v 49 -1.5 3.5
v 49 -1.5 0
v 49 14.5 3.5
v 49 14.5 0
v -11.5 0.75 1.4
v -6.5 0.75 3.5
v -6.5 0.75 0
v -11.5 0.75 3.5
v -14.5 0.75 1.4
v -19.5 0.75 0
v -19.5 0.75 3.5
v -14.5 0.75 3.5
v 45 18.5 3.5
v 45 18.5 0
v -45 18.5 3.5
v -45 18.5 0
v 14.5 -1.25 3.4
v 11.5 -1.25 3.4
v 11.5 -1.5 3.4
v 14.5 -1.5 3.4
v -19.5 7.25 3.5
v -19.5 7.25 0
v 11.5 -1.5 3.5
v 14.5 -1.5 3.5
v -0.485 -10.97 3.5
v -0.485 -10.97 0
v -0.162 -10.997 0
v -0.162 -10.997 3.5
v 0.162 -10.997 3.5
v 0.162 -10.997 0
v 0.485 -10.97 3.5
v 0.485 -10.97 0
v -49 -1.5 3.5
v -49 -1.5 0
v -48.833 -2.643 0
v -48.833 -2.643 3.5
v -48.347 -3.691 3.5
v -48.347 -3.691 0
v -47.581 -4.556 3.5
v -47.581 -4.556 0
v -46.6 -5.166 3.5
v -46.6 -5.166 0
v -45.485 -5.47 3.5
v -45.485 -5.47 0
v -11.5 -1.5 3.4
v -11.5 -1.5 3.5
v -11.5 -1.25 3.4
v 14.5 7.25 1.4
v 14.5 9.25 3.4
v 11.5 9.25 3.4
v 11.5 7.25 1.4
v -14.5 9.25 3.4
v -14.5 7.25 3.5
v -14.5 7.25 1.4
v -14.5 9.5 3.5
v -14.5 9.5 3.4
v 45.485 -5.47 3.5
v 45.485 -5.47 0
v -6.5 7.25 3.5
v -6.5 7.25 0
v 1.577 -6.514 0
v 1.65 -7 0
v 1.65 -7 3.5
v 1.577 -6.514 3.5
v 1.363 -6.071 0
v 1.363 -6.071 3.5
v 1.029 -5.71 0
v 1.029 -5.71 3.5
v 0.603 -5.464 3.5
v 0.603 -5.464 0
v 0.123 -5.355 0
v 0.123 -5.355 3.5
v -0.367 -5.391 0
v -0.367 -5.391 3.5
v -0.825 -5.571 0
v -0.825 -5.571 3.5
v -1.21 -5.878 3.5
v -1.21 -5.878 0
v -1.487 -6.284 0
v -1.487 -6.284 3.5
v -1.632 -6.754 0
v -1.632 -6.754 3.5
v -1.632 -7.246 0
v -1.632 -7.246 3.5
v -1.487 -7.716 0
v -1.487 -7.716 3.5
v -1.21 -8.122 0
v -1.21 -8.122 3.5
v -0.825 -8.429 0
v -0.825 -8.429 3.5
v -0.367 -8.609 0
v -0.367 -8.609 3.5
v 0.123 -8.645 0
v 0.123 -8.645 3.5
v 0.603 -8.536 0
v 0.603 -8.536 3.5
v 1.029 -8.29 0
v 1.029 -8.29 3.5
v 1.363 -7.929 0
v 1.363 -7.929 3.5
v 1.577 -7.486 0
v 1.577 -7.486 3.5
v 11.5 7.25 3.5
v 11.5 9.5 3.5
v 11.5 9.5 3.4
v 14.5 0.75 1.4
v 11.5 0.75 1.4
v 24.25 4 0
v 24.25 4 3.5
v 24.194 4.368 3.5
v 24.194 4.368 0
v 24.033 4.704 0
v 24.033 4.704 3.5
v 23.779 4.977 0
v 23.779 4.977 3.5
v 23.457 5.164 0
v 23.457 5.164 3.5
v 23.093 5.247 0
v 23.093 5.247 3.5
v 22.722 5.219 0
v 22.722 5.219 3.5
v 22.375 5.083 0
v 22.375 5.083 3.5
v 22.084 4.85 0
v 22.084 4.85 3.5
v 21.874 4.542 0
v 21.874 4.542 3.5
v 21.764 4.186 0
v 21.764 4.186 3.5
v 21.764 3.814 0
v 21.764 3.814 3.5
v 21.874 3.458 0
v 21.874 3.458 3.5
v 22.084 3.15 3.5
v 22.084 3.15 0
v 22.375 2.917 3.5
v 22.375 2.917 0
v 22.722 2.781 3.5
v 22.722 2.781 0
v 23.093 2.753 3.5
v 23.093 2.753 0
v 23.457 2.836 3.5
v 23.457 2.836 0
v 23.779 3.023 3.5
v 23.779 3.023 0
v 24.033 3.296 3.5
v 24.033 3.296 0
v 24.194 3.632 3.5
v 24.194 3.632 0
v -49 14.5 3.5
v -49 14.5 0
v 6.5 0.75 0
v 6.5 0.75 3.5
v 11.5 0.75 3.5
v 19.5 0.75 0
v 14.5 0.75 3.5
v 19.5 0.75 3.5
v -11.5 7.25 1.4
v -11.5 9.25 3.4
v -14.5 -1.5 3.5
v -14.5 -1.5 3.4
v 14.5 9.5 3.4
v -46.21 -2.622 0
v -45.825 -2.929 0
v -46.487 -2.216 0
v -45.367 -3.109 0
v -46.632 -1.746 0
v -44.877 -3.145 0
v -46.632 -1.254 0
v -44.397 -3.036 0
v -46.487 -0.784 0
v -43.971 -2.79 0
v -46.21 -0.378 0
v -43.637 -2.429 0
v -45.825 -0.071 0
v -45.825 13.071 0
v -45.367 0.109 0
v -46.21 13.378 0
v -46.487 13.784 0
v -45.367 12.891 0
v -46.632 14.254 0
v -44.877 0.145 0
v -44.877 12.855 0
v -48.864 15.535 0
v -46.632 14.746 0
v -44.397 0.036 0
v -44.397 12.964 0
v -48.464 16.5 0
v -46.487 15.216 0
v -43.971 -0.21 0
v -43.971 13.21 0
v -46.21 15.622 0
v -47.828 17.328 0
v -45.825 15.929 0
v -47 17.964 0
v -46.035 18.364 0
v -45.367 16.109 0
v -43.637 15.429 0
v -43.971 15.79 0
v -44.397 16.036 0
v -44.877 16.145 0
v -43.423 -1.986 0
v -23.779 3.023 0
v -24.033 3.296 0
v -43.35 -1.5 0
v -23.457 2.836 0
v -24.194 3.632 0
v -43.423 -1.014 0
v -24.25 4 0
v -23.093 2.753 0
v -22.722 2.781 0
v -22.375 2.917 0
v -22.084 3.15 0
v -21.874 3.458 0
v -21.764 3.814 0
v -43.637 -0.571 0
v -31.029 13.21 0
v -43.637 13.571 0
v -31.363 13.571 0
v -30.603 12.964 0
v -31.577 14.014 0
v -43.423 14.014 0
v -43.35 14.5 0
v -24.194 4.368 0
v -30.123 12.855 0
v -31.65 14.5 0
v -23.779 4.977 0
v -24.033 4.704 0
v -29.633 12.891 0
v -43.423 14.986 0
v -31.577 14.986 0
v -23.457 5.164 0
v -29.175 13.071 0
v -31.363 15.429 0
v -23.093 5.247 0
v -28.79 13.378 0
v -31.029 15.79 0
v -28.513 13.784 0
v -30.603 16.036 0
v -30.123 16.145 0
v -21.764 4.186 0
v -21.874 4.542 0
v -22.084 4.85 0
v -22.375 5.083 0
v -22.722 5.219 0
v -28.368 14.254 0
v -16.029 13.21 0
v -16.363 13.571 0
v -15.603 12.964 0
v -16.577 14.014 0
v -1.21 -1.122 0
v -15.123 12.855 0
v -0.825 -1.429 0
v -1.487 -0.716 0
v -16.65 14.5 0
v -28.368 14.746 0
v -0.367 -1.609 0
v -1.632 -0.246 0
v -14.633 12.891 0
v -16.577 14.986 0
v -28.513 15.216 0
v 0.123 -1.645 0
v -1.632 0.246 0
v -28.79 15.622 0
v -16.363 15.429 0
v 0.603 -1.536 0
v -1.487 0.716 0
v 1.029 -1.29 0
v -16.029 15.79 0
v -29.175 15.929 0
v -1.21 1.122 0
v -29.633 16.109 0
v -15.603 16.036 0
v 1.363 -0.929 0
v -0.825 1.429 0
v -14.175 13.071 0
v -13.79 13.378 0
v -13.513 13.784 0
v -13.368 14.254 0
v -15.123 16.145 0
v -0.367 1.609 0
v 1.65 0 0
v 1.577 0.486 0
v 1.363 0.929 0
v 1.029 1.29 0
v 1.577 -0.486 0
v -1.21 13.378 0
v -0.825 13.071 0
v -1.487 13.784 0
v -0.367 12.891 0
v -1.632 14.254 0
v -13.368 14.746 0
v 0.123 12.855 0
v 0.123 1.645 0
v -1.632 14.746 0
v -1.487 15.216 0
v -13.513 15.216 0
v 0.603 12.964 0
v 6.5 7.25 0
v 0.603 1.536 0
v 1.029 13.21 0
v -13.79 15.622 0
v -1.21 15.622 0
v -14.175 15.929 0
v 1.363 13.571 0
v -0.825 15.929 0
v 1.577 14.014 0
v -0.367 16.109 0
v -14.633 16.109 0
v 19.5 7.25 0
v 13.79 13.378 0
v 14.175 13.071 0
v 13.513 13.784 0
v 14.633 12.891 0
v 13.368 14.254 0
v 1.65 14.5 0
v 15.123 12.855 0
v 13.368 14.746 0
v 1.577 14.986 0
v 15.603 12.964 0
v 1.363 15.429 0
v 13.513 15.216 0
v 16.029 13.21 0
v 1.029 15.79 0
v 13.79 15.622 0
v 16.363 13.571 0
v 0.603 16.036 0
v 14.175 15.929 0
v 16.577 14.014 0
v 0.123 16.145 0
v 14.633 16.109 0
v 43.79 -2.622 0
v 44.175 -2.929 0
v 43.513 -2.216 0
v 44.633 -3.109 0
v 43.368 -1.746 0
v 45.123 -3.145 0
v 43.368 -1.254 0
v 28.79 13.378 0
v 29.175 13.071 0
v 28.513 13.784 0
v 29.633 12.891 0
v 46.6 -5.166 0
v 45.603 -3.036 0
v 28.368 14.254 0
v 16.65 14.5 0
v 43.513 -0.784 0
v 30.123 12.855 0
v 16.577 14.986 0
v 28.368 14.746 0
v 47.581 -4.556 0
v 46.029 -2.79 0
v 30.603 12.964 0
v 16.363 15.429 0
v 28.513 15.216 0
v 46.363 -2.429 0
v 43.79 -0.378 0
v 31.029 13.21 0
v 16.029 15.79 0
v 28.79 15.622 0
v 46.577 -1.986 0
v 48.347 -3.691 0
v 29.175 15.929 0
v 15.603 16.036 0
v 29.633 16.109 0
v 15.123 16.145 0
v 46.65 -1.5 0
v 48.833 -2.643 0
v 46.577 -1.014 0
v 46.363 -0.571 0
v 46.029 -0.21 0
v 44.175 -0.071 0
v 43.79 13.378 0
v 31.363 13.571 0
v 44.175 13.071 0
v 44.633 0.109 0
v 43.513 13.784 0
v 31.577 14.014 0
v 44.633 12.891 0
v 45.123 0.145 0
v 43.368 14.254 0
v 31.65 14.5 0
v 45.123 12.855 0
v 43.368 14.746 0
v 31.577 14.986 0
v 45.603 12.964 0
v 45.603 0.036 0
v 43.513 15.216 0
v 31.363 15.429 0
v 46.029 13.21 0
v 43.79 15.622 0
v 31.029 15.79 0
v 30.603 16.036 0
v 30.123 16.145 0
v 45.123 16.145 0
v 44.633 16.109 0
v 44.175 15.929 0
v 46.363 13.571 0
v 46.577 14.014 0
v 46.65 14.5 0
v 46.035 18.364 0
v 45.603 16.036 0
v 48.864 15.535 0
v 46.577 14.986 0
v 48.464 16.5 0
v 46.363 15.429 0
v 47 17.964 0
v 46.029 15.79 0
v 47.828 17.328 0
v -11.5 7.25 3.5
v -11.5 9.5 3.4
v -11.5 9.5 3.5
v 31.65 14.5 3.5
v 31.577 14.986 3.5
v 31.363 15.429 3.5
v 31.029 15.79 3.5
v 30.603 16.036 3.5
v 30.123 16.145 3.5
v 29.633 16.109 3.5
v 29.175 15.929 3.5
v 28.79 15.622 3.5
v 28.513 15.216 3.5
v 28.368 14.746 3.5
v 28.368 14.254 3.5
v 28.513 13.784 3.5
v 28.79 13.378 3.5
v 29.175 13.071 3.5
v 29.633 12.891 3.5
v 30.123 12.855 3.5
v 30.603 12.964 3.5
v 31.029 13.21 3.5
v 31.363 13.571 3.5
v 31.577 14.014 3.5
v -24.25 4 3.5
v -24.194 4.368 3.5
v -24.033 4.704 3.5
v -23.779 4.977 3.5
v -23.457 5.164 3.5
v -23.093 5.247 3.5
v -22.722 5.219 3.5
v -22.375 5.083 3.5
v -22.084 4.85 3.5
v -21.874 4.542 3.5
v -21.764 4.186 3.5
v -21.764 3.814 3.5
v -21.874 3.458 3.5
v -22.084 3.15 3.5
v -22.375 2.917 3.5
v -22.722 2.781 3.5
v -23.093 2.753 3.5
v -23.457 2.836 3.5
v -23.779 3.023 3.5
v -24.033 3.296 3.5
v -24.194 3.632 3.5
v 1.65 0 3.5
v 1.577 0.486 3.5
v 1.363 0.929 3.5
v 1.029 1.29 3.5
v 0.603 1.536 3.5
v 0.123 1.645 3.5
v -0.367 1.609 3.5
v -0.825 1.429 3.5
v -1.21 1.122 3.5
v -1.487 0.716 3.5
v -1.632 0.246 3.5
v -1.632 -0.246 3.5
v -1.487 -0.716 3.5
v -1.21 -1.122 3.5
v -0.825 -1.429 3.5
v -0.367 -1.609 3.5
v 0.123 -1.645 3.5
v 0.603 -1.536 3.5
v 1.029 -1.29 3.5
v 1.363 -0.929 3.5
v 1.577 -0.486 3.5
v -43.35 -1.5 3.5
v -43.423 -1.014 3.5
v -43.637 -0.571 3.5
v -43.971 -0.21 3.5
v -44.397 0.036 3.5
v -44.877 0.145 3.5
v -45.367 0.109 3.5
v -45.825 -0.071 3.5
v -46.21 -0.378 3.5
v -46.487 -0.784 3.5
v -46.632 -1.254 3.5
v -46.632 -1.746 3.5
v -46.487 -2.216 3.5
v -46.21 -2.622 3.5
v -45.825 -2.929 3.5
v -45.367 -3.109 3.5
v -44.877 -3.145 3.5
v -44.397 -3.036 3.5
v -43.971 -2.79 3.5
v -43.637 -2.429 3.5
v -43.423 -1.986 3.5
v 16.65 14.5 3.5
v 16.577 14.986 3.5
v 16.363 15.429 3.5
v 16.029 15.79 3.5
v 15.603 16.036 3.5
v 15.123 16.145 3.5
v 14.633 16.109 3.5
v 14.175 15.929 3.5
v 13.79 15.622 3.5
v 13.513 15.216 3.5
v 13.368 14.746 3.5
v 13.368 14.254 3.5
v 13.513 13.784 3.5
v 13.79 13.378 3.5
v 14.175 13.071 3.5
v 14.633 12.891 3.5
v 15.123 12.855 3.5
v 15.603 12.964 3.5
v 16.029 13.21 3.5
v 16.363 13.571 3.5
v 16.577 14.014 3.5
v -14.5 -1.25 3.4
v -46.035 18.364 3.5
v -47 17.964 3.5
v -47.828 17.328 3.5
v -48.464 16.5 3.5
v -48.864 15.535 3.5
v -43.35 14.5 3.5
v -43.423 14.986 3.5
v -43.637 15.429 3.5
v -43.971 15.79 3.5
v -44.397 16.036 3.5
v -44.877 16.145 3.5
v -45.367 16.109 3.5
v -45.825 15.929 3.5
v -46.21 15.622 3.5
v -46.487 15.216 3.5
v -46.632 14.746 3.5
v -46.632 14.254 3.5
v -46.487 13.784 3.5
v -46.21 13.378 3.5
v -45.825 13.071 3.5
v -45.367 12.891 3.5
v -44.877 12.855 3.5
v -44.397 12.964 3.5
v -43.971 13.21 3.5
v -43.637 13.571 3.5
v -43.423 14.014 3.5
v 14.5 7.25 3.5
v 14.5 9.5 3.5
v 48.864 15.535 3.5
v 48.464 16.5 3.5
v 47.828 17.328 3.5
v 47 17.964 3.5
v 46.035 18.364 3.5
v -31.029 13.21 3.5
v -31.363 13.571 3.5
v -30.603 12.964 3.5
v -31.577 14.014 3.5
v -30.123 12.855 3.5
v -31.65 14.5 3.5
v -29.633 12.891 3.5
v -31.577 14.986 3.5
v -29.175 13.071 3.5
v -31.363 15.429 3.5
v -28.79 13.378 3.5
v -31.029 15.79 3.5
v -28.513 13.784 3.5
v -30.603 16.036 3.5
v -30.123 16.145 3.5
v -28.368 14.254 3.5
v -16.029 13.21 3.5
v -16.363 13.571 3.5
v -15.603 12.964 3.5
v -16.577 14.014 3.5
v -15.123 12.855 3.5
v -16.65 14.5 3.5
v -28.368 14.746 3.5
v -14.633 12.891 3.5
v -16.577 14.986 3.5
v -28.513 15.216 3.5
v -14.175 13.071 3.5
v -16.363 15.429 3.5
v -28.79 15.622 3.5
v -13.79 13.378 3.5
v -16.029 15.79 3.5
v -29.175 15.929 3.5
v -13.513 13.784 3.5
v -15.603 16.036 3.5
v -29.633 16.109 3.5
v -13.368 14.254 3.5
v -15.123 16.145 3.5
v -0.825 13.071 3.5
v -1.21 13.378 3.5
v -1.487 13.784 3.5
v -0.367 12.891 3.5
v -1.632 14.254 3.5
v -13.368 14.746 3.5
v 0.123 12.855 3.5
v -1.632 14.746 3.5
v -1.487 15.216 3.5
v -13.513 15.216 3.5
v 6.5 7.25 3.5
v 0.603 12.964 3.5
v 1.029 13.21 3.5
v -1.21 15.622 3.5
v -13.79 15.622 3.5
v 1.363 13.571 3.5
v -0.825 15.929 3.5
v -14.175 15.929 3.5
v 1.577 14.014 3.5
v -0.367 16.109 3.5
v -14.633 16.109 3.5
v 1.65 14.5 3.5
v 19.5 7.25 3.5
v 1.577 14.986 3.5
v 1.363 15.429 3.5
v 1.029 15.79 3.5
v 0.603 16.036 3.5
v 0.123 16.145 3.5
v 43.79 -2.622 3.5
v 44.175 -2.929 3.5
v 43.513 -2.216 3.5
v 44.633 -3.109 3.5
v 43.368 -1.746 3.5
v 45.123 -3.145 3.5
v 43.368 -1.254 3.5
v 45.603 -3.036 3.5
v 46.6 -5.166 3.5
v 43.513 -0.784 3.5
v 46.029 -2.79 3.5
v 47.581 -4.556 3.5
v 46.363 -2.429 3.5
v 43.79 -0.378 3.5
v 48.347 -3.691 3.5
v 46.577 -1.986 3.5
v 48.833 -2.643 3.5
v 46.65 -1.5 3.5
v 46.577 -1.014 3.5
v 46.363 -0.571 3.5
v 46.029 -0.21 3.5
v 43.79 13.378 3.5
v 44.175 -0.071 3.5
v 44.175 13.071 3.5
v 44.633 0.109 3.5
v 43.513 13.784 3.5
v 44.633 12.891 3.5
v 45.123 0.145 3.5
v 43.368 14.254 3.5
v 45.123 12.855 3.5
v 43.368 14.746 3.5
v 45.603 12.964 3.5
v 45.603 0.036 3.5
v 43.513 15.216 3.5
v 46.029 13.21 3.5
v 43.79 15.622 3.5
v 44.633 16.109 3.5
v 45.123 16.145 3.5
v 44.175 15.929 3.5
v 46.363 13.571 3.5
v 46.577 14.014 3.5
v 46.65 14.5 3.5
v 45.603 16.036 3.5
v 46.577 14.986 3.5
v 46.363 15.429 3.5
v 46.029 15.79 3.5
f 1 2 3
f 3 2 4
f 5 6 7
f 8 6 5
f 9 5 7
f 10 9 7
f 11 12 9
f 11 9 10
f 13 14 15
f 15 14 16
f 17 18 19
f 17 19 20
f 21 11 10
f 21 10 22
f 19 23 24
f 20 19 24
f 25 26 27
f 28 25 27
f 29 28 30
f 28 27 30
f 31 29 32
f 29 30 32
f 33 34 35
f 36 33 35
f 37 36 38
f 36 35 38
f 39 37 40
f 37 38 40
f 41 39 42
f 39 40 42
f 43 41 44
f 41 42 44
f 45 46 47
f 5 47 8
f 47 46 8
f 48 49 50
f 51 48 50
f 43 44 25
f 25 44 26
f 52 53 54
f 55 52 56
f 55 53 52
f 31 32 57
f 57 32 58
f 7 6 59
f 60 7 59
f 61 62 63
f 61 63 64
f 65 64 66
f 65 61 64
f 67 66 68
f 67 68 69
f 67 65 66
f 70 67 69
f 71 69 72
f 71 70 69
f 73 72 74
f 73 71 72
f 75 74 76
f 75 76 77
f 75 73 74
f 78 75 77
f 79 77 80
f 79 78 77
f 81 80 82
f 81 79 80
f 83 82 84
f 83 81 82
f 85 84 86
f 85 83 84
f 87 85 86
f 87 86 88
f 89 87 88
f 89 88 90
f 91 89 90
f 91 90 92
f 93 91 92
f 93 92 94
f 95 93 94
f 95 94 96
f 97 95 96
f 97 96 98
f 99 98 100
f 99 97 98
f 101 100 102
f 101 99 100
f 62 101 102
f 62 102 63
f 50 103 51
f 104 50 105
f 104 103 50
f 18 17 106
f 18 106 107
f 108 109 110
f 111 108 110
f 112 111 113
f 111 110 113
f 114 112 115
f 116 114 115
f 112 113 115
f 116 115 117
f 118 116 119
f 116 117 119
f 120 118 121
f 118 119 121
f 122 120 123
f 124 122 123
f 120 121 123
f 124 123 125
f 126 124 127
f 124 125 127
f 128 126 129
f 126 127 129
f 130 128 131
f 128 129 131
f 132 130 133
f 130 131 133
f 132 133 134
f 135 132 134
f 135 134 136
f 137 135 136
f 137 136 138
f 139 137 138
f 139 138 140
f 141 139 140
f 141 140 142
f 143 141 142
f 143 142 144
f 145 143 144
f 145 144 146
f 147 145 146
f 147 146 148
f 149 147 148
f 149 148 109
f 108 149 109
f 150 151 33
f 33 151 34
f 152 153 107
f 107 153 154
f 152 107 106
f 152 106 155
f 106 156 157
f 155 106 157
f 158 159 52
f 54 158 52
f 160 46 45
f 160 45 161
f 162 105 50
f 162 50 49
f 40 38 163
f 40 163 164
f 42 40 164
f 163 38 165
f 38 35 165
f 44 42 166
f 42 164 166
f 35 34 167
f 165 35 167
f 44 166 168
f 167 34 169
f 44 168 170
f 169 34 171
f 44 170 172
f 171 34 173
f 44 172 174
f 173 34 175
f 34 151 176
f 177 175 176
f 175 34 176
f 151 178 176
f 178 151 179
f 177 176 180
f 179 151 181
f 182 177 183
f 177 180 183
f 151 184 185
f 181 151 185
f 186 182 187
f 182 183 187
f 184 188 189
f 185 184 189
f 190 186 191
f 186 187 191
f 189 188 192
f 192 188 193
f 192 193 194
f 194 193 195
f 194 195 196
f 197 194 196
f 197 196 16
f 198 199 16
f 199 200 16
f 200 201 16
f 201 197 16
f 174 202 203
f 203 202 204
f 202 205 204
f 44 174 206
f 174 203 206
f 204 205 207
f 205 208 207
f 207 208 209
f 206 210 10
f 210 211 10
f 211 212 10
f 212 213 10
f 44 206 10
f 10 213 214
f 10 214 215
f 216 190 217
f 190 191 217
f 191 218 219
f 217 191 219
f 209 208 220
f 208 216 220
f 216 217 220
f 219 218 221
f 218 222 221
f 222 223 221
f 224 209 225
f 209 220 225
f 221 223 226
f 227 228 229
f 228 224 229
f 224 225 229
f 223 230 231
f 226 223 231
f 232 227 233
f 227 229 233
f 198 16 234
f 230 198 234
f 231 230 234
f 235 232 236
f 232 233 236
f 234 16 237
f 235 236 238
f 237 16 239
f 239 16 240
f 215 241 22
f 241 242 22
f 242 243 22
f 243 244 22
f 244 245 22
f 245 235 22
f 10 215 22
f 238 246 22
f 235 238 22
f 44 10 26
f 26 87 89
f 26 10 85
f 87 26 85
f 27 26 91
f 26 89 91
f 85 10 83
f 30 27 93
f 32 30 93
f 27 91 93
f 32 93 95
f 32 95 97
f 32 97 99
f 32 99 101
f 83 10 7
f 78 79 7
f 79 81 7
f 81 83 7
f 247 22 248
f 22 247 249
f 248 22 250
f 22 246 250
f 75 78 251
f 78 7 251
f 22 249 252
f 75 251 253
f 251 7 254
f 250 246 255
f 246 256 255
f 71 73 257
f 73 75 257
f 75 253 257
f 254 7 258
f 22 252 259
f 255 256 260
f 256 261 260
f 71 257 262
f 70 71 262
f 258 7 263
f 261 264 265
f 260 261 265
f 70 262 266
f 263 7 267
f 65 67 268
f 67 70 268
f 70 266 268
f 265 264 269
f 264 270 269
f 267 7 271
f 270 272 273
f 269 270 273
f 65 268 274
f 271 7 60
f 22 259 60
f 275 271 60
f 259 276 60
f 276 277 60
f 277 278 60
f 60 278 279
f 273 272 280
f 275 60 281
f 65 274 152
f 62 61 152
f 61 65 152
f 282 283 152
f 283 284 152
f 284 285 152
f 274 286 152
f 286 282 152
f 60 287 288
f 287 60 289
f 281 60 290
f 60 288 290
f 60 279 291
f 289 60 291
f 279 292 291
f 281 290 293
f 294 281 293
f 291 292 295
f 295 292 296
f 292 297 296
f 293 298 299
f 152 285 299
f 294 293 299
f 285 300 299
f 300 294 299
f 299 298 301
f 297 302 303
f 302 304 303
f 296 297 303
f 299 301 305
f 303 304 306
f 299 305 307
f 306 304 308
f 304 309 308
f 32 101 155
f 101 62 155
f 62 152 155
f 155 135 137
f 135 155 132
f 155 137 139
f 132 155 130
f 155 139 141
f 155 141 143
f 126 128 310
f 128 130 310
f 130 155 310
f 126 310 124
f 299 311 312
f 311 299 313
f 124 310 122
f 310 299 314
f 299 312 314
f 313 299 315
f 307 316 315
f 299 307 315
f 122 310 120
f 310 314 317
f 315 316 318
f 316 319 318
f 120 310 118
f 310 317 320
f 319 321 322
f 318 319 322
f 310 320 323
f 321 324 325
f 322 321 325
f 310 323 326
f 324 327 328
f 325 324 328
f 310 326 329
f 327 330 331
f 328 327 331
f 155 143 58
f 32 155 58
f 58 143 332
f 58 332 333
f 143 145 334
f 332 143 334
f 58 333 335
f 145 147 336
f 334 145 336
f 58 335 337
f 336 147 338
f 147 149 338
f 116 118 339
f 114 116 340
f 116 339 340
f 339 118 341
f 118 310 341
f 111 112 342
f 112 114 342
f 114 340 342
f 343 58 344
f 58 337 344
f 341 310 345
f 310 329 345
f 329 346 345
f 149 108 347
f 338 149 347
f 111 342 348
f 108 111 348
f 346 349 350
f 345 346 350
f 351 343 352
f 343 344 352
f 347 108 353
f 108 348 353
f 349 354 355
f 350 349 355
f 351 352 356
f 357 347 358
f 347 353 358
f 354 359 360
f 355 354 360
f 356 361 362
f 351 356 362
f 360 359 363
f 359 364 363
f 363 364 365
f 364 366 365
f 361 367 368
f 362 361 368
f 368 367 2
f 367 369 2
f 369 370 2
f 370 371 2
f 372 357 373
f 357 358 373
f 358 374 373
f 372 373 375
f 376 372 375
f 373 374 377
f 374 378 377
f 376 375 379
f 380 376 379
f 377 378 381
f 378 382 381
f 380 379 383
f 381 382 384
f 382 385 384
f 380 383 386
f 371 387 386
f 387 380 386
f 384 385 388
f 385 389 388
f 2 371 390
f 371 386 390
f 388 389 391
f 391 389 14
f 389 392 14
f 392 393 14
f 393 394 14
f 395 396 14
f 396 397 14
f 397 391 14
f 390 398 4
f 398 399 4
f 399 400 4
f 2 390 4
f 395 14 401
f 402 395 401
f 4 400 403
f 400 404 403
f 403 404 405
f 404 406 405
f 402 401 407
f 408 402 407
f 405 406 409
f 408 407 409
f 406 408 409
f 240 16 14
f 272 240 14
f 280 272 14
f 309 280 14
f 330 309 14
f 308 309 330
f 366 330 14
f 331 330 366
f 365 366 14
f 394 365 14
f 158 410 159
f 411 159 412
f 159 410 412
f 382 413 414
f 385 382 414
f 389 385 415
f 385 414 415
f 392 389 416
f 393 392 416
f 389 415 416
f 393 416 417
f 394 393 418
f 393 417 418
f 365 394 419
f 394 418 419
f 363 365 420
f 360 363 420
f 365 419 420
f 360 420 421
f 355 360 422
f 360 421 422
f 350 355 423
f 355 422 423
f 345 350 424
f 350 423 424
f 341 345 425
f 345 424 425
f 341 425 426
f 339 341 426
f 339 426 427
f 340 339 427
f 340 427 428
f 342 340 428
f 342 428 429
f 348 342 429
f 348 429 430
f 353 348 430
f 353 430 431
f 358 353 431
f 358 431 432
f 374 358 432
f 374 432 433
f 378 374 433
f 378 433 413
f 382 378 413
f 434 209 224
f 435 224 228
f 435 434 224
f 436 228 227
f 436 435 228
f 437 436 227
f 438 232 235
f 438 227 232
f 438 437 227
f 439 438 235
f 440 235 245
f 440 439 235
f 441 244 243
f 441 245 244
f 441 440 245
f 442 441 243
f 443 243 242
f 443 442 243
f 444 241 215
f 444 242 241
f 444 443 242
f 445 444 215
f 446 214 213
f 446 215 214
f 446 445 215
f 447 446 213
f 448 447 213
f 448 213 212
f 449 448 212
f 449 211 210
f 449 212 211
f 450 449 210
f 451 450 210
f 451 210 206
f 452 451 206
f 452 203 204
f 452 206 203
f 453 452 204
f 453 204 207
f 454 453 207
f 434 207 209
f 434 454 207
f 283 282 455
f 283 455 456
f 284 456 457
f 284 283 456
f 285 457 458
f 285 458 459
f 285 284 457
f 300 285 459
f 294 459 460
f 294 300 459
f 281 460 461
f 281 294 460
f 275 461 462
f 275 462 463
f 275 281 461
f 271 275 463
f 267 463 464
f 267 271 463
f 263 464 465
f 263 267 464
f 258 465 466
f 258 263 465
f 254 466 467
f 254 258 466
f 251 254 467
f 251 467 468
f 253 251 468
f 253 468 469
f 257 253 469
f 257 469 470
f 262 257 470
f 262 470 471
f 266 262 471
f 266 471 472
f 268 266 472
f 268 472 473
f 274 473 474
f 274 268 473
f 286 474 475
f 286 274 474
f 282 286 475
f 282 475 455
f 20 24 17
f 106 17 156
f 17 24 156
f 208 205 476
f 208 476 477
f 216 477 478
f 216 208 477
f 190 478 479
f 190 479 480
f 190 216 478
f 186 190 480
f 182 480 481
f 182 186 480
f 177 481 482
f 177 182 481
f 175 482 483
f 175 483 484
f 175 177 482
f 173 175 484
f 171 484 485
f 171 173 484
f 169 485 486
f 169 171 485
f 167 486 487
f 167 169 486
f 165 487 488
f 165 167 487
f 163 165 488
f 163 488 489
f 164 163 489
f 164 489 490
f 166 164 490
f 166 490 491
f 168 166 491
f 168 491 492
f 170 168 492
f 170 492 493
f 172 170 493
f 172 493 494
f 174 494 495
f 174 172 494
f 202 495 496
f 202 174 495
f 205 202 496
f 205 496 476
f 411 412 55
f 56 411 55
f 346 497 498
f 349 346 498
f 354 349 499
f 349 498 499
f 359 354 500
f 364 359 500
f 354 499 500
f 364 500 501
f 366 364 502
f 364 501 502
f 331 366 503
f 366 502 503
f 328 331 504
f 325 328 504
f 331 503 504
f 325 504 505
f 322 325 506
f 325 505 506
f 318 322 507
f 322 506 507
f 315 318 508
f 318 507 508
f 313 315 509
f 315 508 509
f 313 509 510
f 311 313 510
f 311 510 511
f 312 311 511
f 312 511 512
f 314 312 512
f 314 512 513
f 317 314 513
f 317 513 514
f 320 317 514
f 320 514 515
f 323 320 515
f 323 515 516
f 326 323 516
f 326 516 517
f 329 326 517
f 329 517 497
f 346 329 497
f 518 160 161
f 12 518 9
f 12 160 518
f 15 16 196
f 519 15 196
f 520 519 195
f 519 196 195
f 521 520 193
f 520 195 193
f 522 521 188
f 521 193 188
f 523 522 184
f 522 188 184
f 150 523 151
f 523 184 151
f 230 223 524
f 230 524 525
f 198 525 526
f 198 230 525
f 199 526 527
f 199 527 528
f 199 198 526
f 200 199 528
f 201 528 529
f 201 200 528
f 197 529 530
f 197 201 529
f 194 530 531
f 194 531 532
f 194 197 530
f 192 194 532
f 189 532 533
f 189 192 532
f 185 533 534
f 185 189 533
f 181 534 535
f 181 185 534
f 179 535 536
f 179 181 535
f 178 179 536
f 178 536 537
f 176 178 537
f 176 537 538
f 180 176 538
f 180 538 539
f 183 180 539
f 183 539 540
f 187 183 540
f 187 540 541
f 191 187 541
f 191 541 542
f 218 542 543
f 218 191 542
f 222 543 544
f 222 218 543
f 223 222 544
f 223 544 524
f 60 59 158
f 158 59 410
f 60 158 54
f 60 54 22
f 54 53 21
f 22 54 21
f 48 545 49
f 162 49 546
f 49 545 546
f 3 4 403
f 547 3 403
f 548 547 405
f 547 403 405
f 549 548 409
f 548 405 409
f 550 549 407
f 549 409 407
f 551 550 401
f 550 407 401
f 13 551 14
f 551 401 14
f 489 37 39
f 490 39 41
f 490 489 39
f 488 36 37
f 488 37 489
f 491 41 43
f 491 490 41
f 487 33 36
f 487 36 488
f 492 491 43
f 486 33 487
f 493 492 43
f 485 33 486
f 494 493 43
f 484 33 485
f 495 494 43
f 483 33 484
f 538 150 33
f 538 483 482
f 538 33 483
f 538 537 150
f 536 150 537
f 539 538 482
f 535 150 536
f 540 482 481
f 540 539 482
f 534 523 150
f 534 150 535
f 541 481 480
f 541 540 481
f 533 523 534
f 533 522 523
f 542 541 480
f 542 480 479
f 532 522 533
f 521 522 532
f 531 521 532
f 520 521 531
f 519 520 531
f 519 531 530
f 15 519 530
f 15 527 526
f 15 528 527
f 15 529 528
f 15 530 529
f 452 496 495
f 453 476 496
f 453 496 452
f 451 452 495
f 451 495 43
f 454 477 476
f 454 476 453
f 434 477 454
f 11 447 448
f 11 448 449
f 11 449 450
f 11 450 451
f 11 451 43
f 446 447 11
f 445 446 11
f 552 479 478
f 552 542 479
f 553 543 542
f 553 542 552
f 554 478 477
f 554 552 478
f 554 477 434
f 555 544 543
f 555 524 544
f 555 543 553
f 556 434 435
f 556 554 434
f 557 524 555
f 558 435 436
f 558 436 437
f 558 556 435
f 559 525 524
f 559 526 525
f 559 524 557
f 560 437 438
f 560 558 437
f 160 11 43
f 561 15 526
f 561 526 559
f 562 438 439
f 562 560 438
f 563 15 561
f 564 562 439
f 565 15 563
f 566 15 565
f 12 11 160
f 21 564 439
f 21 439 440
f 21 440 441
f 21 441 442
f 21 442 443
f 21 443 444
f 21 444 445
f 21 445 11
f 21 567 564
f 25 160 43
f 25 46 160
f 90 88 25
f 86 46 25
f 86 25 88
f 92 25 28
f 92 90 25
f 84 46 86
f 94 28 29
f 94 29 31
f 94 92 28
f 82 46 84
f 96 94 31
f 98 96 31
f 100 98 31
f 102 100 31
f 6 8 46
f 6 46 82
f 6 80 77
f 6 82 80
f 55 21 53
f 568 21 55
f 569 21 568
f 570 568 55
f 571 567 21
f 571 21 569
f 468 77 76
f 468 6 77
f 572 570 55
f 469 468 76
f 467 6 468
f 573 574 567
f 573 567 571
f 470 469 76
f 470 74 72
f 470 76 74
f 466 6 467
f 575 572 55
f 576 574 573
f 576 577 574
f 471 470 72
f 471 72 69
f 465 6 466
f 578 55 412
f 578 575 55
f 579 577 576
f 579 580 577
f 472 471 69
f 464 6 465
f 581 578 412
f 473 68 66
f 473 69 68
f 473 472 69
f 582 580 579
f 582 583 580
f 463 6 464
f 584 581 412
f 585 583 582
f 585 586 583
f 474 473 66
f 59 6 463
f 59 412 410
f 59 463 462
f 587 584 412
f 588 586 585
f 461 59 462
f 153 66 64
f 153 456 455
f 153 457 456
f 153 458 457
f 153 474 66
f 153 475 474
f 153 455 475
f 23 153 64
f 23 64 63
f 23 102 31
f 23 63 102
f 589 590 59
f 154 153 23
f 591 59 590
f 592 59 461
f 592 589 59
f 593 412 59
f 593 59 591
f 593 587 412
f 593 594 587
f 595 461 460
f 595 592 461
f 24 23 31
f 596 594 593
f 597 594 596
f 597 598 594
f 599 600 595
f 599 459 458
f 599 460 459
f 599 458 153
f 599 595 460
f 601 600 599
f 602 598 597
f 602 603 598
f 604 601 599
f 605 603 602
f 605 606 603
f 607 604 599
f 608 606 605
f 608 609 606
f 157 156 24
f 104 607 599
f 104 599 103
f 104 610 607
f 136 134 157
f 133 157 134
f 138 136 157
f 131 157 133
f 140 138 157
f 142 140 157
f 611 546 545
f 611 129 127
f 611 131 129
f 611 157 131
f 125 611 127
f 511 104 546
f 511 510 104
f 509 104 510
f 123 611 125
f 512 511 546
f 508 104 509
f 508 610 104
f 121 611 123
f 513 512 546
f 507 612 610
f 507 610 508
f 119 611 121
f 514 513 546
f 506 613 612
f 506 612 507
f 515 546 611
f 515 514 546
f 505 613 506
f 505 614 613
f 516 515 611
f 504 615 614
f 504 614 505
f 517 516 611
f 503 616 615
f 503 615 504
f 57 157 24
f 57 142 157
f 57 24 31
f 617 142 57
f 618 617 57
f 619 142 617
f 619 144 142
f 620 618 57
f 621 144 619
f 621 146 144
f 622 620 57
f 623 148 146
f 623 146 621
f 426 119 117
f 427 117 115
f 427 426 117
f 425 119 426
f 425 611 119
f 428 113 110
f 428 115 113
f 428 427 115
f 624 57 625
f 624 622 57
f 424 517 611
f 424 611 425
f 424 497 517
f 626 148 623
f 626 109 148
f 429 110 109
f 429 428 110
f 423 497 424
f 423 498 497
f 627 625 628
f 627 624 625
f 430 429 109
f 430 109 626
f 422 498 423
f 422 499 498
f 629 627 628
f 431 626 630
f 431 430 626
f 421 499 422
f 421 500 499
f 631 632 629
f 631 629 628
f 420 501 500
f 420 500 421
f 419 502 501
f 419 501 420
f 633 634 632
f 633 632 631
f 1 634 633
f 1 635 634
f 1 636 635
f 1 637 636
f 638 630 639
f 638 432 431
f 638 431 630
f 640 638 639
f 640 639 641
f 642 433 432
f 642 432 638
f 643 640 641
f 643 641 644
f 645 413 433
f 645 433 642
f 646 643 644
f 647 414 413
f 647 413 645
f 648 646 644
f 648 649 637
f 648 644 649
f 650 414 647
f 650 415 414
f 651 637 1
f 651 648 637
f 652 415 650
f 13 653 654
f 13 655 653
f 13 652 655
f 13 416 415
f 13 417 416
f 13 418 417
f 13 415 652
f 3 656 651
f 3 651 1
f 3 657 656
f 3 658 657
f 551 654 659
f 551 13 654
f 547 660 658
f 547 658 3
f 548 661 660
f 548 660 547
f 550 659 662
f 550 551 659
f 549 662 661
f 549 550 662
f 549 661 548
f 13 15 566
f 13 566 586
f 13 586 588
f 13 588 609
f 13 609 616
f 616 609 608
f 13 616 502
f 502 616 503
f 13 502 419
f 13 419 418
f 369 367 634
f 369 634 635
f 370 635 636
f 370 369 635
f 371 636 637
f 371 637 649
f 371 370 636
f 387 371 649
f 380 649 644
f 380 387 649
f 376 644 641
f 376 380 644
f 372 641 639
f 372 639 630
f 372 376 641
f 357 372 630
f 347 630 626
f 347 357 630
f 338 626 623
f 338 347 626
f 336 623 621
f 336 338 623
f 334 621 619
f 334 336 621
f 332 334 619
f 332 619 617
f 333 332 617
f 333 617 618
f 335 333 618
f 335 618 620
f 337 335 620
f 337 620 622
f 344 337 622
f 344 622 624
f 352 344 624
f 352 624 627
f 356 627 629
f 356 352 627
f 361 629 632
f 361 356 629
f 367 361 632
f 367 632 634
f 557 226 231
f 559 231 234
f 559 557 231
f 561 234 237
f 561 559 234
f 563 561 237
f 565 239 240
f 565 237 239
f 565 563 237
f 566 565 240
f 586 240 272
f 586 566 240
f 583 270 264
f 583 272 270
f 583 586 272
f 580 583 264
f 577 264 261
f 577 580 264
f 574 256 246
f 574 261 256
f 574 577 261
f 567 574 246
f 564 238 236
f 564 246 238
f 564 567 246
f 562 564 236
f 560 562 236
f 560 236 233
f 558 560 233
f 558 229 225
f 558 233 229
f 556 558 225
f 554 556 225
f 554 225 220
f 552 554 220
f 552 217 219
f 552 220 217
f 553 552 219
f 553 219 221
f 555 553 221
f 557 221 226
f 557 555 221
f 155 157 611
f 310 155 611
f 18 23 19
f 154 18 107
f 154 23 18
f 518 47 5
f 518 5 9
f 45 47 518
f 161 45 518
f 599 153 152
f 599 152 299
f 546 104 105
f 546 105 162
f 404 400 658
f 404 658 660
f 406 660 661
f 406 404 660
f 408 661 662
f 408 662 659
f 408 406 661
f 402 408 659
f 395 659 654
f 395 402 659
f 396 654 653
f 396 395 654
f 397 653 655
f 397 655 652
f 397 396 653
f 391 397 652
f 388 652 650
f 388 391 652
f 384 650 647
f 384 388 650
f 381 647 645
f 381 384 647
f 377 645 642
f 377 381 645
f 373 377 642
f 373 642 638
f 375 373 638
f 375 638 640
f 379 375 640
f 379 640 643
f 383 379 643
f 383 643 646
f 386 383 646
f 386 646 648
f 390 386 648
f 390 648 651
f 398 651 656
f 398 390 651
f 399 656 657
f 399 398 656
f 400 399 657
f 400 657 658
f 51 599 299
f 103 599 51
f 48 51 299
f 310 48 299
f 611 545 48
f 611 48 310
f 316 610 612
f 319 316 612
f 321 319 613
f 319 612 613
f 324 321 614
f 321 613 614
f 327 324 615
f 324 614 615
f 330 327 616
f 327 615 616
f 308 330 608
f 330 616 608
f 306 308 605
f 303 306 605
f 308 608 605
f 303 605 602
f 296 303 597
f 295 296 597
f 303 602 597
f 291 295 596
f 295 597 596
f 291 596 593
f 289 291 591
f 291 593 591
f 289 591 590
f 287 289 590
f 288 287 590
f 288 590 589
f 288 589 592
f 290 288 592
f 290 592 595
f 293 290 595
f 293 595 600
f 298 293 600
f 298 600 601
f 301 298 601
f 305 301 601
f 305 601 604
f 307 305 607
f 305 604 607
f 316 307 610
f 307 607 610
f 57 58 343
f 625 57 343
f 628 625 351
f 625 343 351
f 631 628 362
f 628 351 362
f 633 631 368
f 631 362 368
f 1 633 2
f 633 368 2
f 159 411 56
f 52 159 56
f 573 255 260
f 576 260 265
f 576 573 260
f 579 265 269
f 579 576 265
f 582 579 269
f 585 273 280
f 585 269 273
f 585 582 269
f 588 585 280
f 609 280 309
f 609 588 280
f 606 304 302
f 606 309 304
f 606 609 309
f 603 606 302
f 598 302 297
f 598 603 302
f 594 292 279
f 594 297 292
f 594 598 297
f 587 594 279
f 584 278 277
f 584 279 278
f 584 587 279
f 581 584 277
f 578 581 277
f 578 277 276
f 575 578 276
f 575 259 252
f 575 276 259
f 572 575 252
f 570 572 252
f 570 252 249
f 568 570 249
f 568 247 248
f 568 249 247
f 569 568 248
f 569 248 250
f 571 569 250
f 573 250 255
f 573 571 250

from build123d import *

# Parameters (mm, degrees)
SZKIC1_R                    = 1.65
DODANIE_WYCI_GNI_CIE1_DEPTH = 3.5
SZKIC2_W                    = 13
SZKIC2_H                    = 6.5
WYTNIJ_WYCI_GNI_CIE1_DEPTH  = 4
SZKIC3_R                    = 1.25
WYTNIJ_WYCI_GNI_CIE2_DEPTH  = 4
SZKIC4_R                    = 1.65
WYTNIJ_WYCI_GNI_CIE3_DEPTH  = 4
SZKIC5_W                    = 3
SZKIC5_H                    = 11
WYTNIJ_WYCI_GNI_CIE4_DEPTH  = 0.1
SFAZOWANIE1_SIZE            = 2
SFAZOWANIE2_SIZE            = 2


with BuildPart() as part:
    # Szkic1 → Dodanie-wyciągnięcie1 (new body)
    with BuildSketch(Plane.XY):
        with BuildLine():
            ThreePointArc((-0.48527772, -10.970454072), (0, -11), (0.48527772, -10.970454072))
            Line((0.48527772, -10.970454072), (45.48527772, -5.470454072))
            ThreePointArc((45.48527772, -5.470454072), (47.995088553, -4.151309971), (49, -1.5))
            Line((49, -1.5), (49, 14.5))
            ThreePointArc((49, 14.5), (47.828427125, 17.328427125), (45, 18.5))
            Line((45, 18.5), (-45, 18.5))
            ThreePointArc((-45, 18.5), (-47.828427125, 17.328427125), (-49, 14.5))
            Line((-49, 14.5), (-49, -1.5))
            ThreePointArc((-49, -1.5), (-47.995088553, -4.151309971), (-45.48527772, -5.470454072))
            Line((-45.48527772, -5.470454072), (-0.48527772, -10.970454072))
        make_face()
        with Locations((0, -7)):
            Circle(SZKIC1_R, mode=Mode.SUBTRACT)
        with Locations((-45, -1.5)):
            Circle(SZKIC1_R, mode=Mode.SUBTRACT)
        Circle(SZKIC1_R, mode=Mode.SUBTRACT)
        with Locations((45, -1.5)):
            Circle(SZKIC1_R, mode=Mode.SUBTRACT)
        with Locations((-45, 14.5)):
            Circle(SZKIC1_R, mode=Mode.SUBTRACT)
        with Locations((45, 14.5)):
            Circle(SZKIC1_R, mode=Mode.SUBTRACT)
    extrude(amount=DODANIE_WYCI_GNI_CIE1_DEPTH)

    # Szkic2 → Wytnij-wyciągnięcie1 (cut)
    with BuildSketch(Plane.XY.offset(3.5)):
        with Locations((13, 4)):
            Rectangle(SZKIC2_W, SZKIC2_H)
    wytnij_wyci_gni_cie1 = extrude(amount=-WYTNIJ_WYCI_GNI_CIE1_DEPTH, mode=Mode.SUBTRACT)

    # Szkic3 → Wytnij-wyciągnięcie2 (cut)
    with BuildSketch(Plane.XY.offset(3.5)):
        with Locations((23, 4)):
            Circle(SZKIC3_R)
    wytnij_wyci_gni_cie2 = extrude(amount=-WYTNIJ_WYCI_GNI_CIE2_DEPTH, mode=Mode.SUBTRACT)

    # Lustro1: Wytnij-wyciągnięcie1, Wytnij-wyciągnięcie2 across plane
    add(wytnij_wyci_gni_cie1.mirror(Plane(origin=(0, 0, 0), x_dir=(0, 0, 1), z_dir=(1, 0, 0))), mode=Mode.SUBTRACT)
    add(wytnij_wyci_gni_cie2.mirror(Plane(origin=(0, 0, 0), x_dir=(0, 0, 1), z_dir=(1, 0, 0))), mode=Mode.SUBTRACT)

    # Szkic4 → Wytnij-wyciągnięcie3 (cut)
    with BuildSketch(Plane.XY.offset(3.5)):
        with Locations((0, 14.5)):
            Circle(SZKIC4_R)
        with Locations((15, 14.5)):
            Circle(SZKIC4_R)
        with Locations((30, 14.5)):
            Circle(SZKIC4_R)
    wytnij_wyci_gni_cie3 = extrude(amount=-WYTNIJ_WYCI_GNI_CIE3_DEPTH, mode=Mode.SUBTRACT)

    # Lustro2: Wytnij-wyciągnięcie3 across plane
    add(wytnij_wyci_gni_cie3.mirror(Plane(origin=(0, 0, 0), x_dir=(0, 0, 1), z_dir=(1, 0, 0))), mode=Mode.SUBTRACT)

    # Szkic5 → Wytnij-wyciągnięcie4 (cut)
    with BuildSketch(Plane.XY.offset(3.5)):
        with Locations((13, 4)):
            Rectangle(SZKIC5_W, SZKIC5_H)
    wytnij_wyci_gni_cie4 = extrude(amount=-WYTNIJ_WYCI_GNI_CIE4_DEPTH, mode=Mode.SUBTRACT)

    # Sfazowanie1
    sfazowanie1_edges = [part.edges().sort_by_distance(p)[0] for p in [
        (13, 7.25, 3.4),
        (13, 0.75, 3.4),
    ]]
    chamfer(sfazowanie1_edges, length=SFAZOWANIE1_SIZE)

    # Lustro6: Wytnij-wyciągnięcie4 across plane
    add(wytnij_wyci_gni_cie4.mirror(Plane(origin=(0, 0, 0), x_dir=(0, 0, 1), z_dir=(1, 0, 0))), mode=Mode.SUBTRACT)

    # Sfazowanie2
    sfazowanie2_edges = [part.edges().sort_by_distance(p)[0] for p in [
        (-13, 0.75, 3.4),
        (-13, 7.25, 3.4),
    ]]
    chamfer(sfazowanie2_edges, length=SFAZOWANIE2_SIZE)


solid = part.part
